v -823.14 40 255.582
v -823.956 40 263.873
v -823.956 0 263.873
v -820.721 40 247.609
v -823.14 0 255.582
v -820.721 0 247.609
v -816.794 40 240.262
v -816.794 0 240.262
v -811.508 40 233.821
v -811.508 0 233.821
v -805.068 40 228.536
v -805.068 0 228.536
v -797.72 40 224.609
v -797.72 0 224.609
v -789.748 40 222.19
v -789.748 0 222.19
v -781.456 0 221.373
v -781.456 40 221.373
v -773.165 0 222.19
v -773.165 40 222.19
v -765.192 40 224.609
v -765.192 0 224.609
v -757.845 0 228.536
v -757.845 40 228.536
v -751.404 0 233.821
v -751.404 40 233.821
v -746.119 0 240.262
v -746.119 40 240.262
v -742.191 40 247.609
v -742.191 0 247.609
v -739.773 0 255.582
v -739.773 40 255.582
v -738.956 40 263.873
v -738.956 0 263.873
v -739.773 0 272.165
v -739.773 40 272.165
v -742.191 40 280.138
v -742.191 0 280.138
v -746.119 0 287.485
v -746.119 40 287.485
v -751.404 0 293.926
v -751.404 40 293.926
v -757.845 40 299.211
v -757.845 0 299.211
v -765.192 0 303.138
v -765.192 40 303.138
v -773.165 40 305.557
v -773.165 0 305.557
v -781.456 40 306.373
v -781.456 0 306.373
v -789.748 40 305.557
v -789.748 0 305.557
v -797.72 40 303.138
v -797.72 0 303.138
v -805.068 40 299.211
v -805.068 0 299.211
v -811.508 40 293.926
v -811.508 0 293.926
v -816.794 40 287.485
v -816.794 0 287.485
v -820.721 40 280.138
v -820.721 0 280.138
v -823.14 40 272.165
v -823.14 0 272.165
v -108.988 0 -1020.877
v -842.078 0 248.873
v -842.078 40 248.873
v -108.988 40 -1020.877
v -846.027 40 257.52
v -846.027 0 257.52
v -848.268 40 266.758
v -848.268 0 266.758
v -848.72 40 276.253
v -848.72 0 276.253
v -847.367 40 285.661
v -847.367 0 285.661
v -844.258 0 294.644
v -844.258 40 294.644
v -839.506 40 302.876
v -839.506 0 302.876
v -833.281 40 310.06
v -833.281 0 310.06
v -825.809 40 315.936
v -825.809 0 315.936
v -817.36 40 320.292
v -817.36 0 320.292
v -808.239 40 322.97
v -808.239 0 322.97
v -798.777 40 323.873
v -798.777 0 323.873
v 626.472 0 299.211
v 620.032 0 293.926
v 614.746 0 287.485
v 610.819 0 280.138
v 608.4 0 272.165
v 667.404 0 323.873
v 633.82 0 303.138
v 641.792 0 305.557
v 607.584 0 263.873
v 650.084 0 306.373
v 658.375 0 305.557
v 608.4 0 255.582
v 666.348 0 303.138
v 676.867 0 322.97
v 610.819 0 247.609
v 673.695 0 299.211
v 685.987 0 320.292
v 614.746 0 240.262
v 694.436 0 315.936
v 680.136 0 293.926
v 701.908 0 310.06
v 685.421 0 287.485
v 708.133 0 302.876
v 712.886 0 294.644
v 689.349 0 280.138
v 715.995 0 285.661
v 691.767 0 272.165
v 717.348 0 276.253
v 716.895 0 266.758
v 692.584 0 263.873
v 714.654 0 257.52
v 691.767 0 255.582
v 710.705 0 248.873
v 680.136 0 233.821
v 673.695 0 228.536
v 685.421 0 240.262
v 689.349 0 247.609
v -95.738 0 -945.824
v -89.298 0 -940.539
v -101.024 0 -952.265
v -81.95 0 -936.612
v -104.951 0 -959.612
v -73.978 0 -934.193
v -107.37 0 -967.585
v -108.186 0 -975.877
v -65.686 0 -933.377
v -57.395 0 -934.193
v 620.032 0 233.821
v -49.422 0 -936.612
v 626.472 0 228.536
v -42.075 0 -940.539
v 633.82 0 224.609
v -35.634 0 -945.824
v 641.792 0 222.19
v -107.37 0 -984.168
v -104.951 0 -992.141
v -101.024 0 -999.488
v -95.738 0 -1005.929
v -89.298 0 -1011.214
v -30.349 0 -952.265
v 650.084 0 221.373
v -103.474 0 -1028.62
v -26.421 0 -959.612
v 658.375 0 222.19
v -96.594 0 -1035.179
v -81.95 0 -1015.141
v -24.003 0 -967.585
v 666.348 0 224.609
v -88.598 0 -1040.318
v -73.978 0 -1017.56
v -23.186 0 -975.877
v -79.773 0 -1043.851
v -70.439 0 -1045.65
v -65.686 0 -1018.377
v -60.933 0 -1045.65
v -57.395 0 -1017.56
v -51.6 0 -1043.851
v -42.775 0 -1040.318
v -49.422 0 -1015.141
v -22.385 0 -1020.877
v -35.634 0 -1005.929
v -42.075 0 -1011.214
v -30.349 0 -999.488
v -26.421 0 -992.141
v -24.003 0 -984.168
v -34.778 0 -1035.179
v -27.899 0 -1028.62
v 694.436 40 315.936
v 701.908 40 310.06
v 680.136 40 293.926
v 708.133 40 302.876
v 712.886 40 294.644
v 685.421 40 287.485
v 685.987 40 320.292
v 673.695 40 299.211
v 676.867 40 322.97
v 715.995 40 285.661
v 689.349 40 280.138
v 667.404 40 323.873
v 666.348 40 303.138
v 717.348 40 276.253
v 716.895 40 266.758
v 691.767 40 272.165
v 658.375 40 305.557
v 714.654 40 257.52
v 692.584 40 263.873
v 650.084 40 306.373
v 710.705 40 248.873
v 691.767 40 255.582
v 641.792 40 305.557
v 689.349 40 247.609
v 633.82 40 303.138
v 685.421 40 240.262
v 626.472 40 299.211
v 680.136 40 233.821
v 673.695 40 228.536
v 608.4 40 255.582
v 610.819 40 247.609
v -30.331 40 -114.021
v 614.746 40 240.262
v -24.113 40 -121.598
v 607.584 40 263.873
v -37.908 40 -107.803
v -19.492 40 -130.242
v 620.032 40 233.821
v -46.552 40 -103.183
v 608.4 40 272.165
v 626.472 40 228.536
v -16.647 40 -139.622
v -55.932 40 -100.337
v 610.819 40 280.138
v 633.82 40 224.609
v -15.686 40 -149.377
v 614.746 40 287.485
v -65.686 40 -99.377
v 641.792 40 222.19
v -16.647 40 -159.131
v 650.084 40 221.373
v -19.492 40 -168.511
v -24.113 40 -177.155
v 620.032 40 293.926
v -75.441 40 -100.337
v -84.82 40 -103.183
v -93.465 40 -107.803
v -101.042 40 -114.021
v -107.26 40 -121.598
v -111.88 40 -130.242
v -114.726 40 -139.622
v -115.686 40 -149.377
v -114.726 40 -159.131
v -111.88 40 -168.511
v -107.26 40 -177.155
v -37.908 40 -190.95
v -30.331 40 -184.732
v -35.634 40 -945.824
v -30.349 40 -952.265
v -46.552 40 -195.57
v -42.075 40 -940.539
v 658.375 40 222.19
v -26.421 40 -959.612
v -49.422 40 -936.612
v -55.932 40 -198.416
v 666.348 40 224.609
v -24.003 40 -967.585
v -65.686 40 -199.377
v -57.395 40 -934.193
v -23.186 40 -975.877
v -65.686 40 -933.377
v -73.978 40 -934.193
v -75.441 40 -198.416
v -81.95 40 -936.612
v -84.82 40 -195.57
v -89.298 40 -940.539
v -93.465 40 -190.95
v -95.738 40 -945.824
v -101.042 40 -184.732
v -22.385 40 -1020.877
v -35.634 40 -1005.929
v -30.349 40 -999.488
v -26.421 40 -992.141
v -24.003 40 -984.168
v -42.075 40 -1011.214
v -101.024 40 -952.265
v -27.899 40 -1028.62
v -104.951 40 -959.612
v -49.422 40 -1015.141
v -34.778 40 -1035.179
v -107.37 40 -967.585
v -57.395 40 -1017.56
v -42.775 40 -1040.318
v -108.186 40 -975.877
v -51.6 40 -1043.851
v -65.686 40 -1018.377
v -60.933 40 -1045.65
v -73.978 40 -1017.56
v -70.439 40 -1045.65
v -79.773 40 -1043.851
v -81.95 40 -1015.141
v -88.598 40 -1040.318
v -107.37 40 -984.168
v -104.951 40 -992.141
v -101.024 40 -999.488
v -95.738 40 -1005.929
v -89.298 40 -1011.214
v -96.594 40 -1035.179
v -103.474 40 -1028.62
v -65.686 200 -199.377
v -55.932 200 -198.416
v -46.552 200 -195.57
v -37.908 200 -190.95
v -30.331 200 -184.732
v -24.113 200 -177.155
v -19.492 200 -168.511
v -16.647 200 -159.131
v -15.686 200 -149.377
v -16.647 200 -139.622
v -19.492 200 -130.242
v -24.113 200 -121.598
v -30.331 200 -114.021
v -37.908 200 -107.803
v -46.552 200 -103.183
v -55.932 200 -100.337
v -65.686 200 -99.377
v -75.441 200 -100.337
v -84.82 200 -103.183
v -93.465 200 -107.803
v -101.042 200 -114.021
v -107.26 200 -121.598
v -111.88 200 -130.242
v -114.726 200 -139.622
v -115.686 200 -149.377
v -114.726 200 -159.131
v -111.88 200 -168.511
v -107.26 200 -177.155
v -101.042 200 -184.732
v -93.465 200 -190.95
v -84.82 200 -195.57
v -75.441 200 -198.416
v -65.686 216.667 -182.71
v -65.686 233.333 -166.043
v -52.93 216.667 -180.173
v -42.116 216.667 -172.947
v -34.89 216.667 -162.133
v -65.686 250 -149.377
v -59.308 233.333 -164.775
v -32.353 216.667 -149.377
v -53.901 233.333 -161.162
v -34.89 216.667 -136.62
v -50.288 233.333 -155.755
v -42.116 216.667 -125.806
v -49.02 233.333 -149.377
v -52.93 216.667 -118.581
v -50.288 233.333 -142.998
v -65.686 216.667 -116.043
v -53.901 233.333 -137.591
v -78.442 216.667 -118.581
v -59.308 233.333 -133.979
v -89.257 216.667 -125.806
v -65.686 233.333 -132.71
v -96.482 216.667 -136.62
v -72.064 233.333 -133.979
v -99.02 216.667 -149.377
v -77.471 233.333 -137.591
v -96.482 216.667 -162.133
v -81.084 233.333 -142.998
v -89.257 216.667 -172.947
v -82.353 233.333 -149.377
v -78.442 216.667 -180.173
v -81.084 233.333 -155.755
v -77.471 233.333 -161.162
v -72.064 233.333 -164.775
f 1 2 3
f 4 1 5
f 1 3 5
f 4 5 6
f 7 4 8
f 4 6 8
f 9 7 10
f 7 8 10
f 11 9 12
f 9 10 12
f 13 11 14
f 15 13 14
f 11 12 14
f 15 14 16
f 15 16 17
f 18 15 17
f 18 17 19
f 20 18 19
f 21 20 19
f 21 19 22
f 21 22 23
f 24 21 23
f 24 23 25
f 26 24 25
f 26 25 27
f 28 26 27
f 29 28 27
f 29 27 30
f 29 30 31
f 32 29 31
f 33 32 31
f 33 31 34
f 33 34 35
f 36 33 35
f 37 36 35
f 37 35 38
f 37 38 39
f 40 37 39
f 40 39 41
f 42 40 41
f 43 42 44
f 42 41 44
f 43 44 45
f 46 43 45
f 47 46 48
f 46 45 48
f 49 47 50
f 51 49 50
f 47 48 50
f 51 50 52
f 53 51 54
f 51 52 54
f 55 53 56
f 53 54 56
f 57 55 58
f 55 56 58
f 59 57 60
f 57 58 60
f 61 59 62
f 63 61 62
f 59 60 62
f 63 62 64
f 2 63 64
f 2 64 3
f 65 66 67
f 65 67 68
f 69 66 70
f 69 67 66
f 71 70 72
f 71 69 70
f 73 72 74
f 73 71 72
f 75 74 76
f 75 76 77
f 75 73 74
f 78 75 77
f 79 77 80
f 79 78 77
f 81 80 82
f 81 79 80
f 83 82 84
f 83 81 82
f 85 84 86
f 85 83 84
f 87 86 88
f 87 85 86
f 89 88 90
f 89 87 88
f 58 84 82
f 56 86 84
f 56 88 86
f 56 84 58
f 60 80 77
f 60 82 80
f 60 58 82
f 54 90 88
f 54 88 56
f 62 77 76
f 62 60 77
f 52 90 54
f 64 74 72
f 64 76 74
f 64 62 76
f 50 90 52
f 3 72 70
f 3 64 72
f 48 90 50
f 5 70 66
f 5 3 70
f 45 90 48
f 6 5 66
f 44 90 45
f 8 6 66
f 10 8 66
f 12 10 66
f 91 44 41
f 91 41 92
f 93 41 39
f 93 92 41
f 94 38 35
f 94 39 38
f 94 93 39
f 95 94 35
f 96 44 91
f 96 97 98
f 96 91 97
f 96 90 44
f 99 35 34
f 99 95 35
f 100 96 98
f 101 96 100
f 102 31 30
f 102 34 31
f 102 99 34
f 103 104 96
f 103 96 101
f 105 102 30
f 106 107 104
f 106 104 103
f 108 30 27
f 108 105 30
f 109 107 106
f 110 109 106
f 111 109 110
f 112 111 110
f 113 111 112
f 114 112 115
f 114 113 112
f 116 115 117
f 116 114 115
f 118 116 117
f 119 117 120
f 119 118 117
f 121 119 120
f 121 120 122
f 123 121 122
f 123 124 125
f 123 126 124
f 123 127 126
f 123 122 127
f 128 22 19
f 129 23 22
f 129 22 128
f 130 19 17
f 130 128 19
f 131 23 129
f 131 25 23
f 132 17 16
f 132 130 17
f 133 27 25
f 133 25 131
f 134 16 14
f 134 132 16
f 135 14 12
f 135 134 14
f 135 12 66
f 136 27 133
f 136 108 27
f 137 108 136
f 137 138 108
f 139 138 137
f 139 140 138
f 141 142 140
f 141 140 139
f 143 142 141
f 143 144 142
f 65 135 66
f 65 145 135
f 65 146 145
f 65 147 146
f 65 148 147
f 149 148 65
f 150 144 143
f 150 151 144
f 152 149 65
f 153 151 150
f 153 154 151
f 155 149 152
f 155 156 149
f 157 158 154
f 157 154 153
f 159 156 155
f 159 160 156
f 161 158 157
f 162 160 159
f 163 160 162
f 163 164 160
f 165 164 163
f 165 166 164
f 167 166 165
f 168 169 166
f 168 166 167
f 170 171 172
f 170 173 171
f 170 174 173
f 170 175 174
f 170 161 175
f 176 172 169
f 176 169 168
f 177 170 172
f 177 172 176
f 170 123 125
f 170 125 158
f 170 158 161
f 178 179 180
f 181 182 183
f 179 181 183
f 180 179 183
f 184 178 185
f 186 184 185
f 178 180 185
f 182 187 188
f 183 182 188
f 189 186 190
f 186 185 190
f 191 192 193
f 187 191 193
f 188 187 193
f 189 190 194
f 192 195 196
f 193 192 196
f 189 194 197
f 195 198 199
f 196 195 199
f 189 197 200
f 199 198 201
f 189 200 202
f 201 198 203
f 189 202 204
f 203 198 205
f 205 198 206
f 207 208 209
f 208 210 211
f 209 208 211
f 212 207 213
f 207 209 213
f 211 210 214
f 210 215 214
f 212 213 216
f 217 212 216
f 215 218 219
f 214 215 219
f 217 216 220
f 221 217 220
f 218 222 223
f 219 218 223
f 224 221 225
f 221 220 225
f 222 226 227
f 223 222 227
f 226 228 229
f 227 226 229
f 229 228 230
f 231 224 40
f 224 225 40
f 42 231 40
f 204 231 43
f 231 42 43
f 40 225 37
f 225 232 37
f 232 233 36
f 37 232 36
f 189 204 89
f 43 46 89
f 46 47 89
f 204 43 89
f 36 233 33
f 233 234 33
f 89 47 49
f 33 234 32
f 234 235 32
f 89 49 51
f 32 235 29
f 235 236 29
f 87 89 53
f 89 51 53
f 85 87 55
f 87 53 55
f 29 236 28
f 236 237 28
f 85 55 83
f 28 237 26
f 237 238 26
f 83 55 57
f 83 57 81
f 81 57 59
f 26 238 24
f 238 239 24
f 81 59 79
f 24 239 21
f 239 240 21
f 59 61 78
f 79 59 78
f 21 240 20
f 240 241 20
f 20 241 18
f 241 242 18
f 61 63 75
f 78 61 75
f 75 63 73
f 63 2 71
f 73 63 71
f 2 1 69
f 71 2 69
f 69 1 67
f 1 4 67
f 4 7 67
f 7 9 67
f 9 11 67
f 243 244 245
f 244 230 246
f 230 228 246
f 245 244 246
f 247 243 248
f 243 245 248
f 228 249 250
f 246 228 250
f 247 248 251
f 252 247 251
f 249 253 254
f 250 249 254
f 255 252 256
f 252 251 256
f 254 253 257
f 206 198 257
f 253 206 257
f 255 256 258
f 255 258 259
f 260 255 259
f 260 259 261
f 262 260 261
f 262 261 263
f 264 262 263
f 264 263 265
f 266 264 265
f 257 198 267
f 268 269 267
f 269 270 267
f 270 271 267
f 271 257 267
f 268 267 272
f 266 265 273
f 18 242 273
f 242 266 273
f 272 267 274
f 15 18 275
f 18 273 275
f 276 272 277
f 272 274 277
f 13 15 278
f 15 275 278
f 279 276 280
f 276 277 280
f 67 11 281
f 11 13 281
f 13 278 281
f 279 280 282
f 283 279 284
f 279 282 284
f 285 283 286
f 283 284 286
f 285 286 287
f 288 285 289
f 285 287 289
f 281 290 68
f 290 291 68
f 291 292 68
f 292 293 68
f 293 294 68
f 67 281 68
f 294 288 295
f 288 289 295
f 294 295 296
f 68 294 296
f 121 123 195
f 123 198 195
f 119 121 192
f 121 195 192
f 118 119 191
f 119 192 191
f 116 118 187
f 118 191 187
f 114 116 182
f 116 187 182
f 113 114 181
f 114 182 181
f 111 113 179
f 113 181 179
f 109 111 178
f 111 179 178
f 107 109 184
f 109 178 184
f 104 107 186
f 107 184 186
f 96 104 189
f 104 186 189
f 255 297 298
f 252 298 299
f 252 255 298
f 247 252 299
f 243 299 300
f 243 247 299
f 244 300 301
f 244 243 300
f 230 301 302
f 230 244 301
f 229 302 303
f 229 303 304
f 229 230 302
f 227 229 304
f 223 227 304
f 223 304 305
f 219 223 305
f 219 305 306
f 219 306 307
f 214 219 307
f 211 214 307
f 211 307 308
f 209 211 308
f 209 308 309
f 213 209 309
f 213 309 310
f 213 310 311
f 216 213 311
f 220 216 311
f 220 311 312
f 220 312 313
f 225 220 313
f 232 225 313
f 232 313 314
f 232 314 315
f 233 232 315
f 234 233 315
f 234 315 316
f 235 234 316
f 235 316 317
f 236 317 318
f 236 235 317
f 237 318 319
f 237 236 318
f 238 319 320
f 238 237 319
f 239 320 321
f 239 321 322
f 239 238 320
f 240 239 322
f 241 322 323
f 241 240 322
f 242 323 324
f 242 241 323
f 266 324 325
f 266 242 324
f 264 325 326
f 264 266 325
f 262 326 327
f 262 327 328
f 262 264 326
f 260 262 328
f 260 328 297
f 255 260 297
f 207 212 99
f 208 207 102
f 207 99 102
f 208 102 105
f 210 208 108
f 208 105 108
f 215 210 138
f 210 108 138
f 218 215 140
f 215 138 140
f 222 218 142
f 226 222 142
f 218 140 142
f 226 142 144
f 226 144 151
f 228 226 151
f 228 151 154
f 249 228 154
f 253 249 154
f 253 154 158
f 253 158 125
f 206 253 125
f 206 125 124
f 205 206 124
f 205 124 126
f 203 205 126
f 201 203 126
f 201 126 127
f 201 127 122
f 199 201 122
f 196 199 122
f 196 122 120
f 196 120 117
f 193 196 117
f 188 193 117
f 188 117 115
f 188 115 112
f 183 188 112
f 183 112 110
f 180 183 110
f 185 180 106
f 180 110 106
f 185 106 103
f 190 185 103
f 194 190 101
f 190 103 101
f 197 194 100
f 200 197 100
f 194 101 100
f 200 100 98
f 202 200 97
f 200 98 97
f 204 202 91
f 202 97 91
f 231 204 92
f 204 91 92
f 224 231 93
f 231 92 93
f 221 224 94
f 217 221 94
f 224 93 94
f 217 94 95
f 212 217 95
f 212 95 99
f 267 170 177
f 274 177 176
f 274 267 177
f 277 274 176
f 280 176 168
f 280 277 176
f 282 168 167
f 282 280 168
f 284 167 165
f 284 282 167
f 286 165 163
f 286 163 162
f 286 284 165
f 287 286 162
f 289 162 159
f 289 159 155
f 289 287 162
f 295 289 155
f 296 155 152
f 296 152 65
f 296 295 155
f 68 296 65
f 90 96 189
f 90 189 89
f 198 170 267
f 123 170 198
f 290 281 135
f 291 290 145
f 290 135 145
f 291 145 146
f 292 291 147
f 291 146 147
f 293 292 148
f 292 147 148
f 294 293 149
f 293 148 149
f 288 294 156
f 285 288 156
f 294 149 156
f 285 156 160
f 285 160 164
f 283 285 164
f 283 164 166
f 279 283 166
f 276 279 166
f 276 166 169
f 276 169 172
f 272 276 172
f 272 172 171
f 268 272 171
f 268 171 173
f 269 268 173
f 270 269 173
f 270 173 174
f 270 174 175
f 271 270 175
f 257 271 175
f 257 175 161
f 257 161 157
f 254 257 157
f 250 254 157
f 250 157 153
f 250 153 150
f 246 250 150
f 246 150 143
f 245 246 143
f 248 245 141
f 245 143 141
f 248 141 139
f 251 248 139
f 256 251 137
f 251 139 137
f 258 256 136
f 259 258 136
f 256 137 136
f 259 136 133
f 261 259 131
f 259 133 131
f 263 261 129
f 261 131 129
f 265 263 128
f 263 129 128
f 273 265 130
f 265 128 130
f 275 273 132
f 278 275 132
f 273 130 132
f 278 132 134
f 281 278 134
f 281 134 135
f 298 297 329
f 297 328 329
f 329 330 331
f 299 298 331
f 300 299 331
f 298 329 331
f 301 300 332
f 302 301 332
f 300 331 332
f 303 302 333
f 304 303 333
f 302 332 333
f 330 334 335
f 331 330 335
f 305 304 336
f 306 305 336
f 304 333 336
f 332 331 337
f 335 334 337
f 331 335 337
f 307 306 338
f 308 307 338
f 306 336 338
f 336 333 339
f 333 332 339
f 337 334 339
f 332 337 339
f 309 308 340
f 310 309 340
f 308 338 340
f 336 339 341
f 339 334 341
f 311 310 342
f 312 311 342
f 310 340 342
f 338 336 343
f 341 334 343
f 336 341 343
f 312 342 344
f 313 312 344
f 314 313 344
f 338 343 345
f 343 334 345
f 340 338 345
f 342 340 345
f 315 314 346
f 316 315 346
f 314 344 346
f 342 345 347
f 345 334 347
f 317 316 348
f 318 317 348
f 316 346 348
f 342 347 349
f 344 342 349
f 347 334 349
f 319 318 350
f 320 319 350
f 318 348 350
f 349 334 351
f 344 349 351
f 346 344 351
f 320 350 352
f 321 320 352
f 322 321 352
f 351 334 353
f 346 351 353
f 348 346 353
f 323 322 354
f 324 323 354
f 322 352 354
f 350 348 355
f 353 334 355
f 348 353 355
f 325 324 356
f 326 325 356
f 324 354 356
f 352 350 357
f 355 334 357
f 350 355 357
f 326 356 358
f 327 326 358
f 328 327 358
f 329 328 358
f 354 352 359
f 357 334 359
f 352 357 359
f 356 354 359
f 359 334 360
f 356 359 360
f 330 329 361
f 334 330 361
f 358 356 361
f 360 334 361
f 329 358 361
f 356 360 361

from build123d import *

# Parameters (mm, degrees)
BOSS_EXTRUDE1_DEPTH      = 40
F_1_0_1_DIAMETER_HOLE1_D = 85
SKETCH8_R                = 50
BOSS_EXTRUDE2_DEPTH      = 250
FILLET1_R                = 50
CHAMFER1_SIZE            = 50


with BuildPart() as part:
    # Sketch1 → Boss-Extrude1 (new body)
    with BuildSketch(Plane(origin=(0, 0, 0), x_dir=(1, 0, 0), z_dir=(0, 1, 0))):
        Polygon((-65.68627451, 1095.876515785), (754.006770172, -323.873484215), (-885.379319192, -323.873484215), align=None)
    extrude(amount=BOSS_EXTRUDE1_DEPTH)

    # Ø1.0 (1) Diameter Hole1 (through all)
    with Locations(Plane(origin=(0, 40, 0), x_dir=(1, 0, 0), z_dir=(0, 1, 0))):
        with Locations((-65.68627451, 975.876515785), (-781.456270738, -263.873484215), (650.083721718, -263.873484215)):
            Hole(F_1_0_1_DIAMETER_HOLE1_D / 2)

    # Sketch8 → Boss-Extrude2 (add)
    with BuildSketch(Plane(origin=(0, 0, 0), x_dir=(-1, 0, 0), z_dir=(0, -1, 0))):
        with Locations(Location((65.68627451, 149.376515785, 0), (0, 0, 90))):
            Circle(SKETCH8_R)
    extrude(amount=-BOSS_EXTRUDE2_DEPTH)

    # Fillet1
    fillet1_edges = [part.edges().sort_by_distance(p)[0] for p in [
        (-885.379319192, 20, 323.873484215),
        (754.006770172, 20, 323.873484215),
        (-65.68627451, 20, -1095.876515785),
    ]]
    fillet(fillet1_edges, radius=FILLET1_R)

    # Chamfer1
    chamfer1_edges = [part.edges().sort_by_distance(p)[0] for p in [
        (-65.68627451, 250, -99.376515785),
    ]]
    chamfer(chamfer1_edges, length=CHAMFER1_SIZE)


solid = part.part
